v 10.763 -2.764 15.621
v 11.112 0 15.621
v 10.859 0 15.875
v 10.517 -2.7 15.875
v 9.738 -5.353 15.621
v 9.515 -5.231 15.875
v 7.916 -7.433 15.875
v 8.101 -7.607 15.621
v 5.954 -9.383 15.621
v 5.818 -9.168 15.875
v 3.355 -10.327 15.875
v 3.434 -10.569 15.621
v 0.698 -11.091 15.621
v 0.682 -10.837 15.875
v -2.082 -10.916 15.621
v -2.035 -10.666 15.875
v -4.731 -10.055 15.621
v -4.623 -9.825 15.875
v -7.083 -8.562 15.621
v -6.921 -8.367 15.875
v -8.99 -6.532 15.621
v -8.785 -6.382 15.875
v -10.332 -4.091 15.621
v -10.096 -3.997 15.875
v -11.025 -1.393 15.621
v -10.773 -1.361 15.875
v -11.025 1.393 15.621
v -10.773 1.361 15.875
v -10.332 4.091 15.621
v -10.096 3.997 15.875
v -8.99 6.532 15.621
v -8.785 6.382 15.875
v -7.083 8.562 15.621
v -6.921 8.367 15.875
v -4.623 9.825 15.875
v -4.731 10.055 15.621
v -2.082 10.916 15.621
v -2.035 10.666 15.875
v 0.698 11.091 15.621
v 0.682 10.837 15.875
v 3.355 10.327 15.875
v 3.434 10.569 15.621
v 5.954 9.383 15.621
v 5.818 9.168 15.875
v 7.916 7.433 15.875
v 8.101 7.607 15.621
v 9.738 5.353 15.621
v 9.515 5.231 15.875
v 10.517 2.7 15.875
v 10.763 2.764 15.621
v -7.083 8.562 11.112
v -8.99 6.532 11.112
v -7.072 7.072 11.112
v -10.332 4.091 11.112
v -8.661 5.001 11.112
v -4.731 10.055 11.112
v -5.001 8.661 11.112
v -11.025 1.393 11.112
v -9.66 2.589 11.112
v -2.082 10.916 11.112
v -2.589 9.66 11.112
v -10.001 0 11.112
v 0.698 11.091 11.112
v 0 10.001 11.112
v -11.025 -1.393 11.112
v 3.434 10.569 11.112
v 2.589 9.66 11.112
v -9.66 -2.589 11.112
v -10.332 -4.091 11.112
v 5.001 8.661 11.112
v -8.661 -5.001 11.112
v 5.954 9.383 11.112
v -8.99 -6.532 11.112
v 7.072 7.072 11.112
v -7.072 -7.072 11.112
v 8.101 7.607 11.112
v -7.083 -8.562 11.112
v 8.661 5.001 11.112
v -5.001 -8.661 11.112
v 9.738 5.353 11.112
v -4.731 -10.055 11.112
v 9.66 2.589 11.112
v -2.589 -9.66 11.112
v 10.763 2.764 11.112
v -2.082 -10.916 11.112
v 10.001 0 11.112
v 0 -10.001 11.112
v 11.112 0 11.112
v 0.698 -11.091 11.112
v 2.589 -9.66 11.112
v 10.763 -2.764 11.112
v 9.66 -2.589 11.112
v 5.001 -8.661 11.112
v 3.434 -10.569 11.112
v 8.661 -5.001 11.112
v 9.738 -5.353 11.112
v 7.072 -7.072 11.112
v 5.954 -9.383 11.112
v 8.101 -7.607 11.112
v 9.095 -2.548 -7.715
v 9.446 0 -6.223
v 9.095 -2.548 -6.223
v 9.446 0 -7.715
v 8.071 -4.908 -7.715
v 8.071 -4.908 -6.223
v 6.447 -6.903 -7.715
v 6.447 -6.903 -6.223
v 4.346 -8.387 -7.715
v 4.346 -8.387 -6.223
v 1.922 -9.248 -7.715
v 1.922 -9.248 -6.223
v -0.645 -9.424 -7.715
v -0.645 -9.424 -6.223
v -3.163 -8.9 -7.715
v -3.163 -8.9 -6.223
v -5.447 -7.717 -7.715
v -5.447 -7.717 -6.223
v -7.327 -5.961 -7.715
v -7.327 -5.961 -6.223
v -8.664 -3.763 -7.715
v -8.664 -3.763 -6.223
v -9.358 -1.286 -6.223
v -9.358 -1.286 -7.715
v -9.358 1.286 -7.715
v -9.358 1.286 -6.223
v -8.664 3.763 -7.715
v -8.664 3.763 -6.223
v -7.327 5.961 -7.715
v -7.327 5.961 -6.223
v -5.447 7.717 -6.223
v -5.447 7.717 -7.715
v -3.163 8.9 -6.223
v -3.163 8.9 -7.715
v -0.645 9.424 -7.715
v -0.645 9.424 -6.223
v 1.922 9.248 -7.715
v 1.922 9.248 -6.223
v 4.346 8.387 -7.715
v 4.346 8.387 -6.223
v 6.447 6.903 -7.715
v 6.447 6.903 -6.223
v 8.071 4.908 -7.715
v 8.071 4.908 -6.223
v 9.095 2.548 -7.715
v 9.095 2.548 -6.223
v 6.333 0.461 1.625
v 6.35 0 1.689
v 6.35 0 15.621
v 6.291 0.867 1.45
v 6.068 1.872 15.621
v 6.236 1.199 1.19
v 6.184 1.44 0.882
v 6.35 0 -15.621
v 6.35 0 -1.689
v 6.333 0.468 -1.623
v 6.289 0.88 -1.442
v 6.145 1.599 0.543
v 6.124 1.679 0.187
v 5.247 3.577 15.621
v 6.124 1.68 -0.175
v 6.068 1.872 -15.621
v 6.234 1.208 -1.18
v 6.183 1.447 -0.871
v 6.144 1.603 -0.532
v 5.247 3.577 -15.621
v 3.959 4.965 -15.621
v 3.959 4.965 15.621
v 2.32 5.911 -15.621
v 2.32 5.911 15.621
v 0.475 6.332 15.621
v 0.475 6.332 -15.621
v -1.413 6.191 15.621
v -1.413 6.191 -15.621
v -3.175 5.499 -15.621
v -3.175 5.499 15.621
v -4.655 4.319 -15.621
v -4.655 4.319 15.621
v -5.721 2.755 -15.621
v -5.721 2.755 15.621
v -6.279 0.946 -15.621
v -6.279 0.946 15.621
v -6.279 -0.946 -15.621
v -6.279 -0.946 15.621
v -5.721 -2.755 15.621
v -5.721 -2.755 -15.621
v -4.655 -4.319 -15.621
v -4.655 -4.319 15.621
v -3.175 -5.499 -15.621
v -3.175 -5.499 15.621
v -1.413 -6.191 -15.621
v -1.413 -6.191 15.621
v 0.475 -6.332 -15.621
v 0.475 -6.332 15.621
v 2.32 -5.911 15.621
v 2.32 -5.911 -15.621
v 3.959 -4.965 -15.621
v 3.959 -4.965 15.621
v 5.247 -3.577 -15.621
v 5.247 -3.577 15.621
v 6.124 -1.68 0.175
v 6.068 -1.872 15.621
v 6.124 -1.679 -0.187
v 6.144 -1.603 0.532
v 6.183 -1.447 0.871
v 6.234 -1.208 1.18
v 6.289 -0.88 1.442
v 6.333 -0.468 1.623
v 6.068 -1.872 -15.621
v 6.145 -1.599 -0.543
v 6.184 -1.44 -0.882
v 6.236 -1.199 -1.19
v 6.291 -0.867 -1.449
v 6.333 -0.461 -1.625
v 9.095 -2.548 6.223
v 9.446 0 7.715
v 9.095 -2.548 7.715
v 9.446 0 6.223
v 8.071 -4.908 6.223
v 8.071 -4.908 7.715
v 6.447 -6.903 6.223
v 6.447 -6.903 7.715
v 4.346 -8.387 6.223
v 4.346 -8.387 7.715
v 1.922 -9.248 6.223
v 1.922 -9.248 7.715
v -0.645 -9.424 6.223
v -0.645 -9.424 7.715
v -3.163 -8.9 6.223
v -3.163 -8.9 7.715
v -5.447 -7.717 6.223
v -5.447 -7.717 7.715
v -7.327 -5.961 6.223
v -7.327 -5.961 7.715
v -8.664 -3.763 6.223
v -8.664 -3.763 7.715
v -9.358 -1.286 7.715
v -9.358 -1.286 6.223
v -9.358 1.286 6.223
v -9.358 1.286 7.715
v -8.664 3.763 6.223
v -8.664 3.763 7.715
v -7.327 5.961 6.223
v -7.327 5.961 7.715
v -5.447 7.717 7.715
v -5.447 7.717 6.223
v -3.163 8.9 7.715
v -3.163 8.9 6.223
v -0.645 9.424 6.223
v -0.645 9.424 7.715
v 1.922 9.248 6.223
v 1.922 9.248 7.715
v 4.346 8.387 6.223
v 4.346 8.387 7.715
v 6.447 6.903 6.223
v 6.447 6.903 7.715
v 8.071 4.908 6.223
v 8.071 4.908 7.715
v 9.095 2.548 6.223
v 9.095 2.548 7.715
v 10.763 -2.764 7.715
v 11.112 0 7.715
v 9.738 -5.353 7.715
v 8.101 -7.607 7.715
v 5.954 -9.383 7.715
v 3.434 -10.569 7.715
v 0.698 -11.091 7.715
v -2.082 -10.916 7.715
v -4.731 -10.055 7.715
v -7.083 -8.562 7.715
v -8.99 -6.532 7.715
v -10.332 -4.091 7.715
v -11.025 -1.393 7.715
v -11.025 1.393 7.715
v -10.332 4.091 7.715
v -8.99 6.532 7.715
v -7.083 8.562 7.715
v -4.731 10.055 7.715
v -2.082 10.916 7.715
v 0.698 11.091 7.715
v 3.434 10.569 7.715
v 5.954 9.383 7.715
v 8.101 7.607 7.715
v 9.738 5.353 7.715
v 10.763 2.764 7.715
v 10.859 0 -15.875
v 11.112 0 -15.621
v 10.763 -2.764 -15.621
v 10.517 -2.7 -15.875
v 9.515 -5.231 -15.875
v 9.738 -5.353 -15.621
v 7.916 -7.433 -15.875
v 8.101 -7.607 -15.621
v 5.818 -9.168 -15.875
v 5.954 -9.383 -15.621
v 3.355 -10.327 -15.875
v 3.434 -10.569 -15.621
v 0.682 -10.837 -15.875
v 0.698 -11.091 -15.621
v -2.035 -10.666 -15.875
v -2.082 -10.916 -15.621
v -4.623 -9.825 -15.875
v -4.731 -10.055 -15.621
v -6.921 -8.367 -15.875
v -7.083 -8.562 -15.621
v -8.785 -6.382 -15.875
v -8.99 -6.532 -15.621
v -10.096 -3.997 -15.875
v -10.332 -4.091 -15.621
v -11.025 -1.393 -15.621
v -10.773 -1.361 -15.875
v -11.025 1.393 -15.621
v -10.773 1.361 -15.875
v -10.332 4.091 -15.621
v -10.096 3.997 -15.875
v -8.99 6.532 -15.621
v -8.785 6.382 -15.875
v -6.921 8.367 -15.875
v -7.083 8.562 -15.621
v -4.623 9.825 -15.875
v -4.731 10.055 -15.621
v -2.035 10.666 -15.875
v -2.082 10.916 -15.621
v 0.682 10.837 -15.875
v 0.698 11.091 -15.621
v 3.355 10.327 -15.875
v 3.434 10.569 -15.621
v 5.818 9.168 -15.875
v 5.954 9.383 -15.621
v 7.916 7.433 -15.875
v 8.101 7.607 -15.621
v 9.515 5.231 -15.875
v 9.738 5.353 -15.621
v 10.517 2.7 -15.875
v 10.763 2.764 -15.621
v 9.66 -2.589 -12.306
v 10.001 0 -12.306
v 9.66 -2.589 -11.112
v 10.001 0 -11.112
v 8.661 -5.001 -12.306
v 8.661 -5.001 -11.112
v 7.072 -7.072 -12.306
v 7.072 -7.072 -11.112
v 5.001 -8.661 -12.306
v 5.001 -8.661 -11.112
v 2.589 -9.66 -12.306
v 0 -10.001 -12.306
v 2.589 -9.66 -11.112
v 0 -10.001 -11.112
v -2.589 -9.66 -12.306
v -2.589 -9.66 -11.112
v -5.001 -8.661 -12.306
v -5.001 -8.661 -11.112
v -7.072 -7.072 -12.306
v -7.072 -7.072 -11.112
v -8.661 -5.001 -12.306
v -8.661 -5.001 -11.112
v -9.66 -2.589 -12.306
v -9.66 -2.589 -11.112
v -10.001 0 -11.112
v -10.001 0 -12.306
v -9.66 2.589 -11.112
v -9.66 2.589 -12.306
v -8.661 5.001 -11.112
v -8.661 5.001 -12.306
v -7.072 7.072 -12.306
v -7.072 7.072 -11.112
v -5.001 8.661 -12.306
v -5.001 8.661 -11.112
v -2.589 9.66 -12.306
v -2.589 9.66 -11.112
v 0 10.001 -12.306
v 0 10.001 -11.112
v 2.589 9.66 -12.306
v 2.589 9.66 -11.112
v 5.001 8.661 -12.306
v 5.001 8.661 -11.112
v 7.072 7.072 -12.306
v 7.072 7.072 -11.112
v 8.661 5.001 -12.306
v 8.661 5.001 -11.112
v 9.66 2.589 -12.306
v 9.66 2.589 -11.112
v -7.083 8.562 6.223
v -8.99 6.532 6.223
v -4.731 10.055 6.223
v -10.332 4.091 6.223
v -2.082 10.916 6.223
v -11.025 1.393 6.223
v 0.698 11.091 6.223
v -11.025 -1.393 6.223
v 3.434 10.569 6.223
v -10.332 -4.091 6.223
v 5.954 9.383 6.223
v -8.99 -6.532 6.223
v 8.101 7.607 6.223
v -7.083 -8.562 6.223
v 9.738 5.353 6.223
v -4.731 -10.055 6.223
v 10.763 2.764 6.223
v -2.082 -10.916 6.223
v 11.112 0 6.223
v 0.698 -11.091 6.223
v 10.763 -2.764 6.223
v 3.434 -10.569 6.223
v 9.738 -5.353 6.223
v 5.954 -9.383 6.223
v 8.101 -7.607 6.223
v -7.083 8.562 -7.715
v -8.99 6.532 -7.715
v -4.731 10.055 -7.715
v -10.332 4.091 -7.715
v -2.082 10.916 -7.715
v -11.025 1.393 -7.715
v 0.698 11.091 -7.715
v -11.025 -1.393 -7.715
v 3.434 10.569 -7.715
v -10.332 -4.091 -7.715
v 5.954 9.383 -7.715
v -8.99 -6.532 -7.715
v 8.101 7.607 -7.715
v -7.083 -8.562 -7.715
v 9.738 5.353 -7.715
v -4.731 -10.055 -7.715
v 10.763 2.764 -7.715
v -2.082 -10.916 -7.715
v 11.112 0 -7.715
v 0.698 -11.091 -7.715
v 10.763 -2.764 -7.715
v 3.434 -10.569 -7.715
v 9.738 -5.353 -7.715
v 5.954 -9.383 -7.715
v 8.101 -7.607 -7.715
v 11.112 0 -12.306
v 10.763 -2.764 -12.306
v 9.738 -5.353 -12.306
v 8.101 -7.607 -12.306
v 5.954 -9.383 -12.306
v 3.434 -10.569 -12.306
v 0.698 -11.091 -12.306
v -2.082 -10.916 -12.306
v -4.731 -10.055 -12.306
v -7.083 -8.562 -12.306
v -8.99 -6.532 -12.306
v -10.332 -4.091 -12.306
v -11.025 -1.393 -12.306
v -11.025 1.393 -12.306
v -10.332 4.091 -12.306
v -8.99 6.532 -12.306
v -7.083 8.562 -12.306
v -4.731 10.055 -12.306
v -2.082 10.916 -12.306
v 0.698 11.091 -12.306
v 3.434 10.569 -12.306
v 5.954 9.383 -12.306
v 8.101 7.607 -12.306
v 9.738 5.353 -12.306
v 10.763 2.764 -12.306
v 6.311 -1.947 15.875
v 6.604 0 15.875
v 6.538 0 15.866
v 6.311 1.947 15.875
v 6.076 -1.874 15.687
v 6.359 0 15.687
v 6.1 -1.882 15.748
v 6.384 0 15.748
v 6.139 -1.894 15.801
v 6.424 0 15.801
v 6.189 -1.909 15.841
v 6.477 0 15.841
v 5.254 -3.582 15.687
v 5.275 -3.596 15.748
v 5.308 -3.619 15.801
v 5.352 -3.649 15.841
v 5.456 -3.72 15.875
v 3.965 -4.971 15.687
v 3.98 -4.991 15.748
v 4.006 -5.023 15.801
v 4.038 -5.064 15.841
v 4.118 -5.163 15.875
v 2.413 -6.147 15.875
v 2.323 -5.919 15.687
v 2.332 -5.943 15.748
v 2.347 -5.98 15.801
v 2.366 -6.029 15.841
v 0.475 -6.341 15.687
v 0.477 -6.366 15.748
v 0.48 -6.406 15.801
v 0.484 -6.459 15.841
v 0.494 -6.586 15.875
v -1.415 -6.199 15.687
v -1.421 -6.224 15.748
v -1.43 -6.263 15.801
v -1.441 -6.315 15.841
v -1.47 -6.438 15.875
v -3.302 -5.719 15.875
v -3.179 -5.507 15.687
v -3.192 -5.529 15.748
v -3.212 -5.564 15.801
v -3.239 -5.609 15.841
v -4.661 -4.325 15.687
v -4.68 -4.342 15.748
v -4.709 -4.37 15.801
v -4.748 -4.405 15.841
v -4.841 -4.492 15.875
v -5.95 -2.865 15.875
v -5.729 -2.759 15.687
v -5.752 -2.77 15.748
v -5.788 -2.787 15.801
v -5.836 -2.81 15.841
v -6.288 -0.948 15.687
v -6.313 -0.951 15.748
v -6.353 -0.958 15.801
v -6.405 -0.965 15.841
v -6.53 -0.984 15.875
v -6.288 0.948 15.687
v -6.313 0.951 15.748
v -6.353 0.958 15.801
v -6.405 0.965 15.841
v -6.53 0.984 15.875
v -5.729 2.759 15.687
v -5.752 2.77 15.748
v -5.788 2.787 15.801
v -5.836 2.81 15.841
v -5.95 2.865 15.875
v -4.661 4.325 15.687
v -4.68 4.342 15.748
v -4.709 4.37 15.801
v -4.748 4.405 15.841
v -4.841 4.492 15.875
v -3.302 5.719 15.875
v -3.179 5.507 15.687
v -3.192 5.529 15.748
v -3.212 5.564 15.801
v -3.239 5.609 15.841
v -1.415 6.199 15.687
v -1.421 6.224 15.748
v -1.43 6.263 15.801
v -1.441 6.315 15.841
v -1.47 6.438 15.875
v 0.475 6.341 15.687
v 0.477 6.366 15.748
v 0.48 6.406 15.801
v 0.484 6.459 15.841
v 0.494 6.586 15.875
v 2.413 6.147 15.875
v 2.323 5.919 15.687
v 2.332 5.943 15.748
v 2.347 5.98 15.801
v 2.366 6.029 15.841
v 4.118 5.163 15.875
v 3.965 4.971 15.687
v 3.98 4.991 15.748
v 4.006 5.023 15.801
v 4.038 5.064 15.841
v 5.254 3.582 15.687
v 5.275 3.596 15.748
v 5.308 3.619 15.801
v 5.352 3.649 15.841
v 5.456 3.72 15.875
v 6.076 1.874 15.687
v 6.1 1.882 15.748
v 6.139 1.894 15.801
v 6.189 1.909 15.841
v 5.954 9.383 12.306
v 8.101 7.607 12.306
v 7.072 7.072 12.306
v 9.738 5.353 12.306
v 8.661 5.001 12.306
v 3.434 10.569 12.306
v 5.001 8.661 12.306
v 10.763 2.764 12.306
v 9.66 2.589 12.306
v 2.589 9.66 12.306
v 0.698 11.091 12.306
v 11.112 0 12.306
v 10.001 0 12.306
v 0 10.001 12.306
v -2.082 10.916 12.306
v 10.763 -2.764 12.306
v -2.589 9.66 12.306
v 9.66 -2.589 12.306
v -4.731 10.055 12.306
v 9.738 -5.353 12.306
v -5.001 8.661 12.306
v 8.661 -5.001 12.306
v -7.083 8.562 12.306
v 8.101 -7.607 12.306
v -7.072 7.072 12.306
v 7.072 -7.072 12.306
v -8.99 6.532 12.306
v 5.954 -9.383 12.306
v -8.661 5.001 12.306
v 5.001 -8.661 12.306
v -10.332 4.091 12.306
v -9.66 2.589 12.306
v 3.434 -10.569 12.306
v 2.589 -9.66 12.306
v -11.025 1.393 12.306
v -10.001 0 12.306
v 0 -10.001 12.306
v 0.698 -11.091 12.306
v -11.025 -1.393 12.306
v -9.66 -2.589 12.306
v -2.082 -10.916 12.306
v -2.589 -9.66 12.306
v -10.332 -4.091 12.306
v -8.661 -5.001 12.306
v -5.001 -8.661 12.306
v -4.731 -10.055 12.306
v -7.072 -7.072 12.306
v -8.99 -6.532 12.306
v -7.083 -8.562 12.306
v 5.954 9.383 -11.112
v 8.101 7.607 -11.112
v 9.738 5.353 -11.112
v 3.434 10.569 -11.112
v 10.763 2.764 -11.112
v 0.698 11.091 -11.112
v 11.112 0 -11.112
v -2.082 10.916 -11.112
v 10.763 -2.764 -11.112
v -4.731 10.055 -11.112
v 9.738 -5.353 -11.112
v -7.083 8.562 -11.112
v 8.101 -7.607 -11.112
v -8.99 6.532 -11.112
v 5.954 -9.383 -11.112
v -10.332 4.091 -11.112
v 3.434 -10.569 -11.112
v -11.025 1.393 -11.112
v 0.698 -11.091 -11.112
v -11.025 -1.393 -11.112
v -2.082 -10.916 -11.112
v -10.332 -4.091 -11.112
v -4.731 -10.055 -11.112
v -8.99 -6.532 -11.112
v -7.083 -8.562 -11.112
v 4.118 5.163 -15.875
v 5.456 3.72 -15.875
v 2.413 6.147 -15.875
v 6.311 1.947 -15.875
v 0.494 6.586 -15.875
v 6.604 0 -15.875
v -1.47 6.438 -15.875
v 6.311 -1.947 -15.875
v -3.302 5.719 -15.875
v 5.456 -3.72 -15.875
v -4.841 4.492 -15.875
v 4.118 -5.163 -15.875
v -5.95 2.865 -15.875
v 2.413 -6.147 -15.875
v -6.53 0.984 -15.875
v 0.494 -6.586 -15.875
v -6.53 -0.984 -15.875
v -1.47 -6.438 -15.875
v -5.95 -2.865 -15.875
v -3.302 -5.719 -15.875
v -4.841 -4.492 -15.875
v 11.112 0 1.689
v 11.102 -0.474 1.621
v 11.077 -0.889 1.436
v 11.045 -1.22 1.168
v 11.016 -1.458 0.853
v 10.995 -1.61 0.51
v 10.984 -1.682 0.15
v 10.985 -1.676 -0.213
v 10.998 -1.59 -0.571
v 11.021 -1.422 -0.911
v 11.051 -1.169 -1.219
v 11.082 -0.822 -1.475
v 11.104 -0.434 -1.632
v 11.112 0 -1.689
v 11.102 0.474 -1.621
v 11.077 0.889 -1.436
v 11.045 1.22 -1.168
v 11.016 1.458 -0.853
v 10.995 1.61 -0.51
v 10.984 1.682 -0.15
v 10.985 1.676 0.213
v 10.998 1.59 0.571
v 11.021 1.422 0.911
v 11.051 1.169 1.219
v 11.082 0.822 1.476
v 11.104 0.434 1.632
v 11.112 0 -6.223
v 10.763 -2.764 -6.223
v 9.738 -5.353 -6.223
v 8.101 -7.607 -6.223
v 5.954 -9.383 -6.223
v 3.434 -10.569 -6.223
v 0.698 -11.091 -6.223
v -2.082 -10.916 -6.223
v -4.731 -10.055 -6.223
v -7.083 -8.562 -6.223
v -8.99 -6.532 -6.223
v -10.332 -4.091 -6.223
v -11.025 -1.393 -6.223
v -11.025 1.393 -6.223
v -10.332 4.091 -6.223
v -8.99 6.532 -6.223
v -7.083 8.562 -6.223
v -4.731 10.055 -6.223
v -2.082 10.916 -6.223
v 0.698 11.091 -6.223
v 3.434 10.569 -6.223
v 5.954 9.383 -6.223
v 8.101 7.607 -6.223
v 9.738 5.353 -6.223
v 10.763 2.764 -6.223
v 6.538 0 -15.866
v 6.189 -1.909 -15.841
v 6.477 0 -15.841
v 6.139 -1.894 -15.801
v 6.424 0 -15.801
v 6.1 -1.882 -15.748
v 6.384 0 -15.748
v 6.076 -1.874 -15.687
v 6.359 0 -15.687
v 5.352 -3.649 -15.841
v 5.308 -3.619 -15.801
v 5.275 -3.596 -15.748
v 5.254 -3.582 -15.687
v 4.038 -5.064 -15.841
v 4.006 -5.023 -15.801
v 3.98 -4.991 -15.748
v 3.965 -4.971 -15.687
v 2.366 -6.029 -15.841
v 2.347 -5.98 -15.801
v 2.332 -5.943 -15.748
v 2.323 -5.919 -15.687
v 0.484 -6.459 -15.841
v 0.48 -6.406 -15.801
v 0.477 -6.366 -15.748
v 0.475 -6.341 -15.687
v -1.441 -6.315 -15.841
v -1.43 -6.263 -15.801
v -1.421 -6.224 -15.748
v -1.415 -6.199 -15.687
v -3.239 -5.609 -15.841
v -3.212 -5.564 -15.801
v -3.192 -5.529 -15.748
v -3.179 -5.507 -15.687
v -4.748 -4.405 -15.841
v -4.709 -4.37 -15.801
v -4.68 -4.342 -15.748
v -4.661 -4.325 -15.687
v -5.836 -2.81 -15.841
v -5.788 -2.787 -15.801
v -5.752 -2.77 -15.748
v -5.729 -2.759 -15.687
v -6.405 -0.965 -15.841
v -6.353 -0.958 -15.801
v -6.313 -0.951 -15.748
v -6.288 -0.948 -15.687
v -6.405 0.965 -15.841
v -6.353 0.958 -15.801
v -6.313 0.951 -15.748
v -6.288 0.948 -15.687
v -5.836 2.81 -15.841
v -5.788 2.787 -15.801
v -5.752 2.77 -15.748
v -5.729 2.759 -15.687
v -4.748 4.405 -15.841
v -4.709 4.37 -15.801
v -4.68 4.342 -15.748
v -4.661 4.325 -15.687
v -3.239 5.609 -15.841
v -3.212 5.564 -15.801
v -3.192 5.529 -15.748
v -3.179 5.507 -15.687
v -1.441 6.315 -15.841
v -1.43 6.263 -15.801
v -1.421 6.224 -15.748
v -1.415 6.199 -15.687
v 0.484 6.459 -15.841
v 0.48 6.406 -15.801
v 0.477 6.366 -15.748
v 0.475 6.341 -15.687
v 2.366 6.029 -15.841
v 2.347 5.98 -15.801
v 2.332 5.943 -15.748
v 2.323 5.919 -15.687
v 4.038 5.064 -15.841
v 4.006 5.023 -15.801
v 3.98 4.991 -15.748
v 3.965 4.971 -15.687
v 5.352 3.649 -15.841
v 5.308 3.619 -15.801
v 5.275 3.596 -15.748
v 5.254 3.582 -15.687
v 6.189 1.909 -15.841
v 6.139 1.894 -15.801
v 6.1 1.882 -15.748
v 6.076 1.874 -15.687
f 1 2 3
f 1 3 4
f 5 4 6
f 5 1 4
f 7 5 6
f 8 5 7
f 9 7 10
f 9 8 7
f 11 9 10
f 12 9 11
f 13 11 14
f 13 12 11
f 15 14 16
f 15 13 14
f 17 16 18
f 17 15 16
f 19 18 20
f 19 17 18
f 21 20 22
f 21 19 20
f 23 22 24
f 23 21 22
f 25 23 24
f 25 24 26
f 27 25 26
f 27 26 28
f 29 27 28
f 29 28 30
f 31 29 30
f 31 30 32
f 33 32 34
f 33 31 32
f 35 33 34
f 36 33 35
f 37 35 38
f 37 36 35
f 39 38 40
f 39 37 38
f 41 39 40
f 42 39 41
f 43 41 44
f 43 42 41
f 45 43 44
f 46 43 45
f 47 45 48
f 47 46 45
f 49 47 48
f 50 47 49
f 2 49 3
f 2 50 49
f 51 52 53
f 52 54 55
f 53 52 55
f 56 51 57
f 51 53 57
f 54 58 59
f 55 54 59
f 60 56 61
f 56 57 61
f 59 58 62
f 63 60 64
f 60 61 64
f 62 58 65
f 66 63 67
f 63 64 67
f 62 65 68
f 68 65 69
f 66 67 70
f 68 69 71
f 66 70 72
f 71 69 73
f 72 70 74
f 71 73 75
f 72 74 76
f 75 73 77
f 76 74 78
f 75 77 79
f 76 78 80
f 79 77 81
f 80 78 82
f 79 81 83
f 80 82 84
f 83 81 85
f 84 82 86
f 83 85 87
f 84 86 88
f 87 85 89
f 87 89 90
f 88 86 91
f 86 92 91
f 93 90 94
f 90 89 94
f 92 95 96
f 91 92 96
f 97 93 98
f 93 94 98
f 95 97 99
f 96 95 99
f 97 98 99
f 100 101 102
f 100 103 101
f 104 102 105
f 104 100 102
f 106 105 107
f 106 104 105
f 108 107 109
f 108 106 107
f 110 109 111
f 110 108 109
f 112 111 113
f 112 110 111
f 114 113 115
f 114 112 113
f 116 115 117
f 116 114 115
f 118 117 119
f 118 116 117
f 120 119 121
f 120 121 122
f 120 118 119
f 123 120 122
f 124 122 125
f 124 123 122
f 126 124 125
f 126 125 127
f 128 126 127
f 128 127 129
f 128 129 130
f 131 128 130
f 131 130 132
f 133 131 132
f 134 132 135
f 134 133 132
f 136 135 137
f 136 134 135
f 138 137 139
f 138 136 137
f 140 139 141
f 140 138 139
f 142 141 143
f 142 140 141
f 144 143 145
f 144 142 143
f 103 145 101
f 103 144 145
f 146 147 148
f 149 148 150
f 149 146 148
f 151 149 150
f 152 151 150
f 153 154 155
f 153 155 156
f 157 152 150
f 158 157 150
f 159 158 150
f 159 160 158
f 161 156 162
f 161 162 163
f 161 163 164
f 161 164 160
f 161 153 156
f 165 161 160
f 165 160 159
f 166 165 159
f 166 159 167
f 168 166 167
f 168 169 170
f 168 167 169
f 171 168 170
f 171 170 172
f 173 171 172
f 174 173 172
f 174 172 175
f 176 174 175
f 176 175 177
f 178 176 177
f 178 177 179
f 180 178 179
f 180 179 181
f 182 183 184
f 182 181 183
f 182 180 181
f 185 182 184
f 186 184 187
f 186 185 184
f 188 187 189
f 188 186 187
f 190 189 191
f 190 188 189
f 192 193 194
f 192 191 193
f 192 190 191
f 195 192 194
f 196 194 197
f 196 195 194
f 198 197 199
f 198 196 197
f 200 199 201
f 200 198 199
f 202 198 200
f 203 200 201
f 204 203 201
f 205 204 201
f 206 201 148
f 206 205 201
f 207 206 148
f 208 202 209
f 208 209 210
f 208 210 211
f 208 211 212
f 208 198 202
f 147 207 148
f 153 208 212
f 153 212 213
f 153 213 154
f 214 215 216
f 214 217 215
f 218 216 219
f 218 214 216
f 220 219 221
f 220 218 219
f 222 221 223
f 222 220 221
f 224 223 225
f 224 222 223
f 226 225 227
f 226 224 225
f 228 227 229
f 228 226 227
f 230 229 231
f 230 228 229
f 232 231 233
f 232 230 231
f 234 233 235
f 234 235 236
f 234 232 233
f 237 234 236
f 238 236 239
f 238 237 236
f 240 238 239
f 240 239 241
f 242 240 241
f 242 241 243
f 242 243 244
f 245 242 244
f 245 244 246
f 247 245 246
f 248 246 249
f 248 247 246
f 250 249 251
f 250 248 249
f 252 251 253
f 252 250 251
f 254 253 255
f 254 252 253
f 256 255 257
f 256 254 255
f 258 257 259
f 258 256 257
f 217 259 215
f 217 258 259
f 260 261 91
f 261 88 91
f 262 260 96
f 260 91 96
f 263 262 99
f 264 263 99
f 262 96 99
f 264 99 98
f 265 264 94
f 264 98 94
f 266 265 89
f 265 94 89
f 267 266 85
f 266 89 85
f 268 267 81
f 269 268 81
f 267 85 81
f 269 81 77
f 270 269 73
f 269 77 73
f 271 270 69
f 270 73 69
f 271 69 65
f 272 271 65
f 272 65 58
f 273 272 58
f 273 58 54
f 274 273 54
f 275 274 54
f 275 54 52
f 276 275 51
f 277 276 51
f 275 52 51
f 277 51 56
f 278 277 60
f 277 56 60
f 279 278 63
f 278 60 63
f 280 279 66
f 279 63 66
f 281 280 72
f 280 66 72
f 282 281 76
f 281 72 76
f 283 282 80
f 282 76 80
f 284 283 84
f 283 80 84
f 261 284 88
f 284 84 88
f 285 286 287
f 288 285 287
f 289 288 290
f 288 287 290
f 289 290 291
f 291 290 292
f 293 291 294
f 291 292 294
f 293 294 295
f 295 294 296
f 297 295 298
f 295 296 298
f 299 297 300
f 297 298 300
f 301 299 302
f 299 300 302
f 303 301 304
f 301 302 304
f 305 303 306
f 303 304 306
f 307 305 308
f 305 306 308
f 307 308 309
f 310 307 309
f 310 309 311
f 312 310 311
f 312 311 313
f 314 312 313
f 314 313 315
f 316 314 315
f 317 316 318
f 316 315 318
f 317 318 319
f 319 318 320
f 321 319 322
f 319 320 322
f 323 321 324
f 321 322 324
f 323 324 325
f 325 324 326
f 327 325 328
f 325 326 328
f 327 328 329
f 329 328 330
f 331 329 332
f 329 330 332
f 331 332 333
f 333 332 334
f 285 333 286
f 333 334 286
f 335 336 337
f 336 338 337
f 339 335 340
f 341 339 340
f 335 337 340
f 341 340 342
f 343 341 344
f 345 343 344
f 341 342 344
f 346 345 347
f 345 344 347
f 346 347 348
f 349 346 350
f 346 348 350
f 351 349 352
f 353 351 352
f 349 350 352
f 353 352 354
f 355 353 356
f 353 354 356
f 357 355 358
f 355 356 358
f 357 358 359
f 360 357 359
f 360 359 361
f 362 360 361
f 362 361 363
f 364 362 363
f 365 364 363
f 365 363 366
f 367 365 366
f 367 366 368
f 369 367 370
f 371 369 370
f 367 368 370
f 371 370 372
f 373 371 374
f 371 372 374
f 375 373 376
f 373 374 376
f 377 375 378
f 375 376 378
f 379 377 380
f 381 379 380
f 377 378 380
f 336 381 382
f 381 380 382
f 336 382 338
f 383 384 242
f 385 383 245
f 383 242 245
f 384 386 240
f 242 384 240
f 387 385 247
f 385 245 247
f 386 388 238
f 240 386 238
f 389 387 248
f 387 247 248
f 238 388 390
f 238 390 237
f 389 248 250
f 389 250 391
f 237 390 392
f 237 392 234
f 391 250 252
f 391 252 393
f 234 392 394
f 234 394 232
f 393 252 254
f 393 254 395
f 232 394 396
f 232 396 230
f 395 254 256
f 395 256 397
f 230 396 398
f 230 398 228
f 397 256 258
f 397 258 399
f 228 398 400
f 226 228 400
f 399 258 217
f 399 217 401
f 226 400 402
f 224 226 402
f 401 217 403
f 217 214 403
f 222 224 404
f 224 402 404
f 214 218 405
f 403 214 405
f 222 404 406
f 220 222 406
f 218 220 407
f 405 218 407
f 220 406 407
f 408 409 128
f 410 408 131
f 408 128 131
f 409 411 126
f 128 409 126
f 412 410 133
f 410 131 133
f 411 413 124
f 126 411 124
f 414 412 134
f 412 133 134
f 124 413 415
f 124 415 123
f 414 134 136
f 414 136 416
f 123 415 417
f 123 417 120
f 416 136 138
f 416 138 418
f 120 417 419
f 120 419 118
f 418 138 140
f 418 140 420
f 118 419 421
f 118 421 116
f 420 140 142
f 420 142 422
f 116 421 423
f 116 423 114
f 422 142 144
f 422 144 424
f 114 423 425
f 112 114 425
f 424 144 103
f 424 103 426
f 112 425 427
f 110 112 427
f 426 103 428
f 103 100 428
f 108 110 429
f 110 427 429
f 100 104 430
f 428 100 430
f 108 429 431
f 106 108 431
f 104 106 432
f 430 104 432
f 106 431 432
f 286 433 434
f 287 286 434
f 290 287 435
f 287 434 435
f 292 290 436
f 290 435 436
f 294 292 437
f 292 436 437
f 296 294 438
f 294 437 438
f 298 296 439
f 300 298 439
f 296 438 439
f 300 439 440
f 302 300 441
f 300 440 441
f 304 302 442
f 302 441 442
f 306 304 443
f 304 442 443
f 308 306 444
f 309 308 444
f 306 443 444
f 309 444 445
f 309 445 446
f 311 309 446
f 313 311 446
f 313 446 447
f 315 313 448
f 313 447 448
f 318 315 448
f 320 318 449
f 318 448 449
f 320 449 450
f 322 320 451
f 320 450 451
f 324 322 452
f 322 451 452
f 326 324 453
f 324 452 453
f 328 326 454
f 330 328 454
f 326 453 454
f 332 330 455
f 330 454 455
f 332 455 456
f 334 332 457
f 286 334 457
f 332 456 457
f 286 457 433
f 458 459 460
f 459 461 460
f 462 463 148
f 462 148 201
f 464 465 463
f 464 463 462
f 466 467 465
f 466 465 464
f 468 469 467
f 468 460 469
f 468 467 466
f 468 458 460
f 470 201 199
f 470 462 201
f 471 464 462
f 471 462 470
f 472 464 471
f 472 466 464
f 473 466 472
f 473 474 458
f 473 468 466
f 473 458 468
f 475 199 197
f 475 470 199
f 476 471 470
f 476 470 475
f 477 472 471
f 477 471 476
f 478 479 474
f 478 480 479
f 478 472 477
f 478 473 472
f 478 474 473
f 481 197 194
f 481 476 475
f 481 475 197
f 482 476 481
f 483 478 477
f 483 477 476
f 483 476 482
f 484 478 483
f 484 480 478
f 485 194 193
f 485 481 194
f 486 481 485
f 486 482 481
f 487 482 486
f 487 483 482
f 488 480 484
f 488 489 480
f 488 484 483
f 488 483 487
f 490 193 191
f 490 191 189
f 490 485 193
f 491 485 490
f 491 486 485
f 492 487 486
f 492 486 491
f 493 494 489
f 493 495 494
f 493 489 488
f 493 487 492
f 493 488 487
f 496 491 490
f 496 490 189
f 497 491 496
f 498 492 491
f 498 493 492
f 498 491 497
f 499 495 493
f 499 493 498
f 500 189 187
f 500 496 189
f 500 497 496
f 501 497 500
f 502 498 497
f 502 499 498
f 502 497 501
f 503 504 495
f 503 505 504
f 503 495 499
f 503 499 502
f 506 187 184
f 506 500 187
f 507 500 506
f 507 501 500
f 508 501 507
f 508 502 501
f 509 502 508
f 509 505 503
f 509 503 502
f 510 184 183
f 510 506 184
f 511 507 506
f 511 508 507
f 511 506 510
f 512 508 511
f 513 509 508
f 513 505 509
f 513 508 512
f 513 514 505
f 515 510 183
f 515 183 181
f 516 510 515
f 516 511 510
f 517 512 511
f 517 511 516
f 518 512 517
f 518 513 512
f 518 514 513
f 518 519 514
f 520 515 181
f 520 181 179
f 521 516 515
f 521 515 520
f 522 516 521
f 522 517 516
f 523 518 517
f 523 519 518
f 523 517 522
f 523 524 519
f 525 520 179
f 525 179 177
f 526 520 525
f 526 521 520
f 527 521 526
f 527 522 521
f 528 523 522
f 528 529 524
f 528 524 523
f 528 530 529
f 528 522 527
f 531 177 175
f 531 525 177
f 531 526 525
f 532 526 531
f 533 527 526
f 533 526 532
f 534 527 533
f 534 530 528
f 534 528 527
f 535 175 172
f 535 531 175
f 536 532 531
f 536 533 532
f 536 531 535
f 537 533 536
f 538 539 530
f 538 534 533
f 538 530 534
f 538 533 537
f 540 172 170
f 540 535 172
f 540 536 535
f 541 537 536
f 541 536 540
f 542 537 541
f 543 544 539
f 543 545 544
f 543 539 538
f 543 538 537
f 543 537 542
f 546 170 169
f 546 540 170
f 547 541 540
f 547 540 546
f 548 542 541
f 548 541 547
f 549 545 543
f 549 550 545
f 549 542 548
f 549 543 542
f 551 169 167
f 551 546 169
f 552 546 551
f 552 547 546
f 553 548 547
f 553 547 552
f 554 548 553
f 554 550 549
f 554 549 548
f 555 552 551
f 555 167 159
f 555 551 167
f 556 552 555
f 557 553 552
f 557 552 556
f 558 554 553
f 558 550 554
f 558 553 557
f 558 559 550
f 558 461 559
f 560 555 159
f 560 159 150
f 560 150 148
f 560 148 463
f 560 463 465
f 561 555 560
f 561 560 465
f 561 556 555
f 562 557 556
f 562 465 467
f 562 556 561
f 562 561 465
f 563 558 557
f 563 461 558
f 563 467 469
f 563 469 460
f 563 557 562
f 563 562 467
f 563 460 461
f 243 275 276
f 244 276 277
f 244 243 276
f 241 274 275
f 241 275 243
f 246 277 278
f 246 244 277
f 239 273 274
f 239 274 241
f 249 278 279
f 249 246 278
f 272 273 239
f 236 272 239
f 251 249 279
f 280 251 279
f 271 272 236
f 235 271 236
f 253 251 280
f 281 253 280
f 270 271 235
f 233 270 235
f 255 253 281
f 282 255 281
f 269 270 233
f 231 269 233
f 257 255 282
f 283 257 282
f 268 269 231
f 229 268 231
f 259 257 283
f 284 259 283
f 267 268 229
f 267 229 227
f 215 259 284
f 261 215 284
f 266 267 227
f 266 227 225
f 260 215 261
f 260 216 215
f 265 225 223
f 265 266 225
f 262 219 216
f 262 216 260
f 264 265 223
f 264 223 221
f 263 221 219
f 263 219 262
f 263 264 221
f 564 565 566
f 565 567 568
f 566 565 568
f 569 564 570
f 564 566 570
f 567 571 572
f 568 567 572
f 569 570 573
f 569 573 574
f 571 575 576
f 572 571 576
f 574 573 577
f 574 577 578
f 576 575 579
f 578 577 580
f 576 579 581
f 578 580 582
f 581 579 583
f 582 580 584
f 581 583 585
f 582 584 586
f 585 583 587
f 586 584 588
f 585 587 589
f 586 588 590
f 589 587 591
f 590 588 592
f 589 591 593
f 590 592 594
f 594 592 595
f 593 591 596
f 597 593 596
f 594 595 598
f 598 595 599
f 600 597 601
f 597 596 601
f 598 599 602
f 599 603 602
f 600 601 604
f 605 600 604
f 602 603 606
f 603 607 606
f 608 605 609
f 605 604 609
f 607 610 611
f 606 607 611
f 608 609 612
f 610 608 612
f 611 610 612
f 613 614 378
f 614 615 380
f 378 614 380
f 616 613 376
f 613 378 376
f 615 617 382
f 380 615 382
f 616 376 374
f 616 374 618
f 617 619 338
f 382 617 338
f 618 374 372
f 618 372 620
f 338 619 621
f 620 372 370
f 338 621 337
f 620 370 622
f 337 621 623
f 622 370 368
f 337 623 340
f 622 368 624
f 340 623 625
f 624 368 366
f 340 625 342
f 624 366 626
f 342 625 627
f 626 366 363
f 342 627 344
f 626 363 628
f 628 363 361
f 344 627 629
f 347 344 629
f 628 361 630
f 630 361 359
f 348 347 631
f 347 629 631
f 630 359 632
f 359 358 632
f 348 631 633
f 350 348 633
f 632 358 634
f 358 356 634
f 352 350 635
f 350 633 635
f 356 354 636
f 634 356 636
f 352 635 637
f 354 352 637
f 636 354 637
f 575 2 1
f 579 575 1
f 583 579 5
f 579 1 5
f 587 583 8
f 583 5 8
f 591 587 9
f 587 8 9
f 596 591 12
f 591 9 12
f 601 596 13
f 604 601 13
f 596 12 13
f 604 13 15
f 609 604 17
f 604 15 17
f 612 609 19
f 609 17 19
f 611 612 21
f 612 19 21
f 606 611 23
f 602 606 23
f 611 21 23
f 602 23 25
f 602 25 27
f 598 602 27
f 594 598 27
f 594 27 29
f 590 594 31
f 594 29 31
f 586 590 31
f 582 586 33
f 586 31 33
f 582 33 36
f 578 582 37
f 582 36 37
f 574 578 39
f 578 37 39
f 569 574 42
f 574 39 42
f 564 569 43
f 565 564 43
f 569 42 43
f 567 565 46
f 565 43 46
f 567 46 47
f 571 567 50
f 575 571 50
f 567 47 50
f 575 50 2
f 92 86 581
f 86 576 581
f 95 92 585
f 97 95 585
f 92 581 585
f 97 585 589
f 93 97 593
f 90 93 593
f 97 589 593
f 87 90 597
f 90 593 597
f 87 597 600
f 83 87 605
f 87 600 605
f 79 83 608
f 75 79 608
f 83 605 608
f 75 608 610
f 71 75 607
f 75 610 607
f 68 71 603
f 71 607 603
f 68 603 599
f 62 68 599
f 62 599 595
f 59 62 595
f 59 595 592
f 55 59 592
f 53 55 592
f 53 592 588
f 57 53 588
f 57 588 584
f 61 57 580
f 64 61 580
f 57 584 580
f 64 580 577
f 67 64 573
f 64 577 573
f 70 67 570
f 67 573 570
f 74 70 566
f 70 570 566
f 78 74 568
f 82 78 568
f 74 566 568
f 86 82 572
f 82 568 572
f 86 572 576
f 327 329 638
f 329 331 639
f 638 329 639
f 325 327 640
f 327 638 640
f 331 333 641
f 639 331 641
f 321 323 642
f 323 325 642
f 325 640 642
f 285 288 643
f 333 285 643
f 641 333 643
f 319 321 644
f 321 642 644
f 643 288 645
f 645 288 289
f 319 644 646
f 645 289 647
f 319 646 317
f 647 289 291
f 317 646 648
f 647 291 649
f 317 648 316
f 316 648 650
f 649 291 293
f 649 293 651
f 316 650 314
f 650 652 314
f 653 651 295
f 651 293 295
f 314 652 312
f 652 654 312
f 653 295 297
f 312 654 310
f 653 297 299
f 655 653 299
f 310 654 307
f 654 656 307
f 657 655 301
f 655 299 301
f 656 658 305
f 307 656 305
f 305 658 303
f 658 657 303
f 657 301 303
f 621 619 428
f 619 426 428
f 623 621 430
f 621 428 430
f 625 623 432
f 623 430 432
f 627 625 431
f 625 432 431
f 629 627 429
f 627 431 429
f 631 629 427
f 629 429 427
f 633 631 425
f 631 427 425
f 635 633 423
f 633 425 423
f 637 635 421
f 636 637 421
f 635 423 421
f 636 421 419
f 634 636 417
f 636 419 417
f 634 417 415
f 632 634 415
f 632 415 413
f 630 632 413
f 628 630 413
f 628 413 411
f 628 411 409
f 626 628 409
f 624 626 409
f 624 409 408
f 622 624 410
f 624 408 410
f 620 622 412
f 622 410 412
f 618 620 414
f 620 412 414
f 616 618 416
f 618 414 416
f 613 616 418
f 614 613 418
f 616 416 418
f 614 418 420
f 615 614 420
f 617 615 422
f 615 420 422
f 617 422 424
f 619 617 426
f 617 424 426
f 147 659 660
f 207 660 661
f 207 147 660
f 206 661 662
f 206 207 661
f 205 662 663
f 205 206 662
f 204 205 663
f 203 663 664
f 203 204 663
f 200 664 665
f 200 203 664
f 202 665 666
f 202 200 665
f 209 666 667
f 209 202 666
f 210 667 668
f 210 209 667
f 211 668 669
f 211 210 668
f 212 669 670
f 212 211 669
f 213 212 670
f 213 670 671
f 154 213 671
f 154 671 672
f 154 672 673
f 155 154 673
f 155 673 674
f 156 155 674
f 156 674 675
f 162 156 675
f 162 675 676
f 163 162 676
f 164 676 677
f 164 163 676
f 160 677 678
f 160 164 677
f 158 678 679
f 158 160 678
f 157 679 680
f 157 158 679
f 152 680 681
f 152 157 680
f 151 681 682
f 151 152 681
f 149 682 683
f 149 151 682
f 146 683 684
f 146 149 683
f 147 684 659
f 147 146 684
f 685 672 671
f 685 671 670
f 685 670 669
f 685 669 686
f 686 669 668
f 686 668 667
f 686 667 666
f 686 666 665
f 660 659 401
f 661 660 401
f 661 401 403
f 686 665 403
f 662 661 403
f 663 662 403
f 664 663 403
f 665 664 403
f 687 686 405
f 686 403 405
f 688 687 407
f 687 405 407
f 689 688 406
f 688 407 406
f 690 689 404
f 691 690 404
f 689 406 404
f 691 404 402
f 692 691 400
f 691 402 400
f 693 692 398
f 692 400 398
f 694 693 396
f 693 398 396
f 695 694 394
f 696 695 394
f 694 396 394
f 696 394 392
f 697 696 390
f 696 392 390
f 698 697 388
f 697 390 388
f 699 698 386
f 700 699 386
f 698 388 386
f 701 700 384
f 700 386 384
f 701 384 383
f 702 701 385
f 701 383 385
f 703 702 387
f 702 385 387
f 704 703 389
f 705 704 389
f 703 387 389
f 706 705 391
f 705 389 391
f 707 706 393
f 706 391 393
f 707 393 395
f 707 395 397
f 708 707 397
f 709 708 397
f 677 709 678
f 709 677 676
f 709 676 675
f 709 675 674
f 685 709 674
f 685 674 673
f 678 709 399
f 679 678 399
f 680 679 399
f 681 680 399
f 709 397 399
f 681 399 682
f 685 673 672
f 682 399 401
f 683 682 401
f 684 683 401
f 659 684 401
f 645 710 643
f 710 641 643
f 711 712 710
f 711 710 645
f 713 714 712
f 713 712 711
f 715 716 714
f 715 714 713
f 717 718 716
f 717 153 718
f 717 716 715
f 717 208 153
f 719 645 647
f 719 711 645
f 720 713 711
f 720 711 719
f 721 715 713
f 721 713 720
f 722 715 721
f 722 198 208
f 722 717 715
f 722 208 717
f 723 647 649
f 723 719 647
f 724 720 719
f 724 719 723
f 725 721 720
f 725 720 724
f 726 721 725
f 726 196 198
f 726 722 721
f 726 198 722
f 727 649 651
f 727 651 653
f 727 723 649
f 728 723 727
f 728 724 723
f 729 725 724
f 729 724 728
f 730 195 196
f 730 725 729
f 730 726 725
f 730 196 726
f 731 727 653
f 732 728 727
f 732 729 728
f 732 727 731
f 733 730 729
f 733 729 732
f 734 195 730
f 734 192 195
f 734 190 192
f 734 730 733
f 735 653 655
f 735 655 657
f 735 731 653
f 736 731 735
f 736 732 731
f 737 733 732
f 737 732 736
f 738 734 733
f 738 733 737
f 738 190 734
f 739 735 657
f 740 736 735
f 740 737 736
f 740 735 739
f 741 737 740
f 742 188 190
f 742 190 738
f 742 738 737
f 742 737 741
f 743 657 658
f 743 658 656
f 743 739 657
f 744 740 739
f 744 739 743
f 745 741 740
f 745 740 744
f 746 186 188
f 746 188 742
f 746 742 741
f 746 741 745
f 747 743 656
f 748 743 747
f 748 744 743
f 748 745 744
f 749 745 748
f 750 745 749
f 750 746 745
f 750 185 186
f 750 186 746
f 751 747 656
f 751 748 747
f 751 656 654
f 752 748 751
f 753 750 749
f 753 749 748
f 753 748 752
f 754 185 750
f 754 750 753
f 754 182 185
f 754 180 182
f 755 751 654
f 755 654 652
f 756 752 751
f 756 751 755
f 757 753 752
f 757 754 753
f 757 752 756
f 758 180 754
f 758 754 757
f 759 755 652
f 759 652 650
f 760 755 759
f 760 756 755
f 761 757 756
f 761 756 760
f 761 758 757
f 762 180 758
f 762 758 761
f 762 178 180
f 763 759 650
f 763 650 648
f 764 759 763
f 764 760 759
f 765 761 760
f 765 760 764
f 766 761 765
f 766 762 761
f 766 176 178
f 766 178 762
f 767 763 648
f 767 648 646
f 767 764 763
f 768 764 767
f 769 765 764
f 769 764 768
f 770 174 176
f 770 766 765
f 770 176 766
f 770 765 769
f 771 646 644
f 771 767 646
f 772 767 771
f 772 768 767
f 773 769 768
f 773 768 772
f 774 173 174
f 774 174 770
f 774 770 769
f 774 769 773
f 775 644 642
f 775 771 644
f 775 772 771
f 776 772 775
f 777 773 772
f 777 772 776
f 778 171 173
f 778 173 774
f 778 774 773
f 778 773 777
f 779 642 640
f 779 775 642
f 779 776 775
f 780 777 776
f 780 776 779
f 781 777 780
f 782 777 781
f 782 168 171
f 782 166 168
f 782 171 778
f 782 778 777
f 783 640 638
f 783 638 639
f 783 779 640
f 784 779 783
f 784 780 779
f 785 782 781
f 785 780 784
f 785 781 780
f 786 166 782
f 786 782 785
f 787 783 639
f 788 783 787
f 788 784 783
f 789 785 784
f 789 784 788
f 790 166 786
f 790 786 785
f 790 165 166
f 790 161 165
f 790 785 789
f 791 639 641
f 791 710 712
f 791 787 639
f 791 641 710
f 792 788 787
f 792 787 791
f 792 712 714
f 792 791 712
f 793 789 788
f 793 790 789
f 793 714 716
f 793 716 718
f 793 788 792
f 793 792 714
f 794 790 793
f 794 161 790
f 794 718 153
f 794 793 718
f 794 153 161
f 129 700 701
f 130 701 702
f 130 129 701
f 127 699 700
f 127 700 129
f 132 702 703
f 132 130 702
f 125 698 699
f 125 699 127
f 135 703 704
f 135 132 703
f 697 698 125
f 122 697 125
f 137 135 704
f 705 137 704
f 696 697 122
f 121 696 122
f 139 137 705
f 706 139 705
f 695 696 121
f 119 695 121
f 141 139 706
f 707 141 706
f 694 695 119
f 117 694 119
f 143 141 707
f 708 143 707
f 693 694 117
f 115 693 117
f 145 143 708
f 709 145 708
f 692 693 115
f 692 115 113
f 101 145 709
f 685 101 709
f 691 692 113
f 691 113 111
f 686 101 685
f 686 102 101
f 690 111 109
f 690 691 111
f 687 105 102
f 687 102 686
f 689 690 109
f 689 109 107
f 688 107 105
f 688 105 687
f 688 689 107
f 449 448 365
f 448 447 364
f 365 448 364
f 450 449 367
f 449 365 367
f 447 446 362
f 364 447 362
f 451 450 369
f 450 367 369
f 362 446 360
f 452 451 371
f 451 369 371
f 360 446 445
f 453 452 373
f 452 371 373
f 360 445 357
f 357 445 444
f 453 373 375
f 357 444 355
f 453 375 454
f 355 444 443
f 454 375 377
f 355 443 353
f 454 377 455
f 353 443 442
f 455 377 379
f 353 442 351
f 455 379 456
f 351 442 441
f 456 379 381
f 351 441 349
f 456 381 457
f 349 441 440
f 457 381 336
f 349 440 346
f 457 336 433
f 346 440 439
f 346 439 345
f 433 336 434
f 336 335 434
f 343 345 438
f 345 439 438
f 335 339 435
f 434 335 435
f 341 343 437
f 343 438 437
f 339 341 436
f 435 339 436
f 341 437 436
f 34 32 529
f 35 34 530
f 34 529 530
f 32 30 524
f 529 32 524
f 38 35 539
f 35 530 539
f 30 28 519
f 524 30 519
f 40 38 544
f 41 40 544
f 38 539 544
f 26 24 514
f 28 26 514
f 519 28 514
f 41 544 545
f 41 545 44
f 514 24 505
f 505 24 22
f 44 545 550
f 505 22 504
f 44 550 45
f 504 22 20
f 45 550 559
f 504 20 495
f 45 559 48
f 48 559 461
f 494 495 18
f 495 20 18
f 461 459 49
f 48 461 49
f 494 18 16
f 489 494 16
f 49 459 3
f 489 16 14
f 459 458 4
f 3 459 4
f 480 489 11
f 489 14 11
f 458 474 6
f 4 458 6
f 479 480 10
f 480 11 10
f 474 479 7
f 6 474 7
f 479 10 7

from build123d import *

# Parameters (mm, degrees)
BORE_DEPTH           = 23.338105056
BORE_DEPTH_BACK      = 23.338105056
SKETCH2_R            = 6.35
RETAINING_HOLE_2_R   = 1.6891
RETAINING_HOLE_DEPTH = 23.338105056
ID_FILLET_R          = 0.254
OD_CHAMFER_SIZE      = 0.254
O_RINGS_2_W          = 1.49225
O_RINGS_2_H          = 1.666875


with BuildPart() as part:
    # Sketch1 → Bearing (revolve)
    with BuildSketch(Plane(origin=(0, 0, 0), x_dir=(0, 0, -1), z_dir=(1, 0, 0)), mode=Mode.PRIVATE) as bearing_sk:
        Polygon((-15.875, 0), (15.875, 0), (15.875, -11.1125), (12.3063, -11.1125), (12.3063, -10.00125), (11.1125, -10.00125), (11.1125, -11.1125), (-11.1125, -11.1125), (-11.1125, -10.00125), (-12.3063, -10.00125), (-12.3063, -11.1125), (-15.875, -11.1125), align=None)
    revolve(bearing_sk.sketch.rotate(Axis((0, 0, 15.875), (0, 0, -1)), 270), axis=Axis((0, 0, 15.875), (0, 0, -1)))

    # Sketch2 → Bore (cut, two sides: drawn at the far end of the back side and taken through both)
    with BuildSketch(Plane.XY.offset(-BORE_DEPTH_BACK)):
        Circle(SKETCH2_R)
    extrude(amount=BORE_DEPTH + BORE_DEPTH_BACK, mode=Mode.SUBTRACT)

    # Retaining Hole 2 → Retaining Hole (cut, through all)
    with BuildSketch(Plane(origin=(0, 0, 0), x_dir=(0, 0, -1), z_dir=(1, 0, 0))):
        with Locations(Location((0, 0, 0), (0, 0, 180))):
            Circle(RETAINING_HOLE_2_R)
    extrude(amount=RETAINING_HOLE_DEPTH, mode=Mode.SUBTRACT)

    # ID Fillet
    id_fillet_edges = [part.edges().sort_by_distance(p)[0] for p in [
        (-6.35, 0, -15.875),
        (-6.35, 0, 15.875),
    ]]
    fillet(id_fillet_edges, radius=ID_FILLET_R)

    # OD Chamfer
    od_chamfer_edges = [part.edges().sort_by_distance(p)[0] for p in [
        (-11.1125, 0, 15.875),
        (-11.1125, 0, -15.875),
    ]]
    chamfer(od_chamfer_edges, length=OD_CHAMFER_SIZE)

    # O-Rings 2 → O-Rings (revolve, cut)
    with BuildSketch(Plane(origin=(0, 0, 0), x_dir=(0, 0, -1), z_dir=(1, 0, 0)), mode=Mode.PRIVATE) as o_rings_sk:
        with Locations((-6.969125, -10.2790625)):
            Rectangle(O_RINGS_2_W, O_RINGS_2_H)
        with Locations((6.969125, -10.2790625)):
            Rectangle(O_RINGS_2_W, O_RINGS_2_H)
    revolve(o_rings_sk.sketch.rotate(Axis((0, 0, 15.875), (0, 0, -1)), 270), axis=Axis((0, 0, 15.875), (0, 0, -1)), mode=Mode.SUBTRACT)


solid = part.part
